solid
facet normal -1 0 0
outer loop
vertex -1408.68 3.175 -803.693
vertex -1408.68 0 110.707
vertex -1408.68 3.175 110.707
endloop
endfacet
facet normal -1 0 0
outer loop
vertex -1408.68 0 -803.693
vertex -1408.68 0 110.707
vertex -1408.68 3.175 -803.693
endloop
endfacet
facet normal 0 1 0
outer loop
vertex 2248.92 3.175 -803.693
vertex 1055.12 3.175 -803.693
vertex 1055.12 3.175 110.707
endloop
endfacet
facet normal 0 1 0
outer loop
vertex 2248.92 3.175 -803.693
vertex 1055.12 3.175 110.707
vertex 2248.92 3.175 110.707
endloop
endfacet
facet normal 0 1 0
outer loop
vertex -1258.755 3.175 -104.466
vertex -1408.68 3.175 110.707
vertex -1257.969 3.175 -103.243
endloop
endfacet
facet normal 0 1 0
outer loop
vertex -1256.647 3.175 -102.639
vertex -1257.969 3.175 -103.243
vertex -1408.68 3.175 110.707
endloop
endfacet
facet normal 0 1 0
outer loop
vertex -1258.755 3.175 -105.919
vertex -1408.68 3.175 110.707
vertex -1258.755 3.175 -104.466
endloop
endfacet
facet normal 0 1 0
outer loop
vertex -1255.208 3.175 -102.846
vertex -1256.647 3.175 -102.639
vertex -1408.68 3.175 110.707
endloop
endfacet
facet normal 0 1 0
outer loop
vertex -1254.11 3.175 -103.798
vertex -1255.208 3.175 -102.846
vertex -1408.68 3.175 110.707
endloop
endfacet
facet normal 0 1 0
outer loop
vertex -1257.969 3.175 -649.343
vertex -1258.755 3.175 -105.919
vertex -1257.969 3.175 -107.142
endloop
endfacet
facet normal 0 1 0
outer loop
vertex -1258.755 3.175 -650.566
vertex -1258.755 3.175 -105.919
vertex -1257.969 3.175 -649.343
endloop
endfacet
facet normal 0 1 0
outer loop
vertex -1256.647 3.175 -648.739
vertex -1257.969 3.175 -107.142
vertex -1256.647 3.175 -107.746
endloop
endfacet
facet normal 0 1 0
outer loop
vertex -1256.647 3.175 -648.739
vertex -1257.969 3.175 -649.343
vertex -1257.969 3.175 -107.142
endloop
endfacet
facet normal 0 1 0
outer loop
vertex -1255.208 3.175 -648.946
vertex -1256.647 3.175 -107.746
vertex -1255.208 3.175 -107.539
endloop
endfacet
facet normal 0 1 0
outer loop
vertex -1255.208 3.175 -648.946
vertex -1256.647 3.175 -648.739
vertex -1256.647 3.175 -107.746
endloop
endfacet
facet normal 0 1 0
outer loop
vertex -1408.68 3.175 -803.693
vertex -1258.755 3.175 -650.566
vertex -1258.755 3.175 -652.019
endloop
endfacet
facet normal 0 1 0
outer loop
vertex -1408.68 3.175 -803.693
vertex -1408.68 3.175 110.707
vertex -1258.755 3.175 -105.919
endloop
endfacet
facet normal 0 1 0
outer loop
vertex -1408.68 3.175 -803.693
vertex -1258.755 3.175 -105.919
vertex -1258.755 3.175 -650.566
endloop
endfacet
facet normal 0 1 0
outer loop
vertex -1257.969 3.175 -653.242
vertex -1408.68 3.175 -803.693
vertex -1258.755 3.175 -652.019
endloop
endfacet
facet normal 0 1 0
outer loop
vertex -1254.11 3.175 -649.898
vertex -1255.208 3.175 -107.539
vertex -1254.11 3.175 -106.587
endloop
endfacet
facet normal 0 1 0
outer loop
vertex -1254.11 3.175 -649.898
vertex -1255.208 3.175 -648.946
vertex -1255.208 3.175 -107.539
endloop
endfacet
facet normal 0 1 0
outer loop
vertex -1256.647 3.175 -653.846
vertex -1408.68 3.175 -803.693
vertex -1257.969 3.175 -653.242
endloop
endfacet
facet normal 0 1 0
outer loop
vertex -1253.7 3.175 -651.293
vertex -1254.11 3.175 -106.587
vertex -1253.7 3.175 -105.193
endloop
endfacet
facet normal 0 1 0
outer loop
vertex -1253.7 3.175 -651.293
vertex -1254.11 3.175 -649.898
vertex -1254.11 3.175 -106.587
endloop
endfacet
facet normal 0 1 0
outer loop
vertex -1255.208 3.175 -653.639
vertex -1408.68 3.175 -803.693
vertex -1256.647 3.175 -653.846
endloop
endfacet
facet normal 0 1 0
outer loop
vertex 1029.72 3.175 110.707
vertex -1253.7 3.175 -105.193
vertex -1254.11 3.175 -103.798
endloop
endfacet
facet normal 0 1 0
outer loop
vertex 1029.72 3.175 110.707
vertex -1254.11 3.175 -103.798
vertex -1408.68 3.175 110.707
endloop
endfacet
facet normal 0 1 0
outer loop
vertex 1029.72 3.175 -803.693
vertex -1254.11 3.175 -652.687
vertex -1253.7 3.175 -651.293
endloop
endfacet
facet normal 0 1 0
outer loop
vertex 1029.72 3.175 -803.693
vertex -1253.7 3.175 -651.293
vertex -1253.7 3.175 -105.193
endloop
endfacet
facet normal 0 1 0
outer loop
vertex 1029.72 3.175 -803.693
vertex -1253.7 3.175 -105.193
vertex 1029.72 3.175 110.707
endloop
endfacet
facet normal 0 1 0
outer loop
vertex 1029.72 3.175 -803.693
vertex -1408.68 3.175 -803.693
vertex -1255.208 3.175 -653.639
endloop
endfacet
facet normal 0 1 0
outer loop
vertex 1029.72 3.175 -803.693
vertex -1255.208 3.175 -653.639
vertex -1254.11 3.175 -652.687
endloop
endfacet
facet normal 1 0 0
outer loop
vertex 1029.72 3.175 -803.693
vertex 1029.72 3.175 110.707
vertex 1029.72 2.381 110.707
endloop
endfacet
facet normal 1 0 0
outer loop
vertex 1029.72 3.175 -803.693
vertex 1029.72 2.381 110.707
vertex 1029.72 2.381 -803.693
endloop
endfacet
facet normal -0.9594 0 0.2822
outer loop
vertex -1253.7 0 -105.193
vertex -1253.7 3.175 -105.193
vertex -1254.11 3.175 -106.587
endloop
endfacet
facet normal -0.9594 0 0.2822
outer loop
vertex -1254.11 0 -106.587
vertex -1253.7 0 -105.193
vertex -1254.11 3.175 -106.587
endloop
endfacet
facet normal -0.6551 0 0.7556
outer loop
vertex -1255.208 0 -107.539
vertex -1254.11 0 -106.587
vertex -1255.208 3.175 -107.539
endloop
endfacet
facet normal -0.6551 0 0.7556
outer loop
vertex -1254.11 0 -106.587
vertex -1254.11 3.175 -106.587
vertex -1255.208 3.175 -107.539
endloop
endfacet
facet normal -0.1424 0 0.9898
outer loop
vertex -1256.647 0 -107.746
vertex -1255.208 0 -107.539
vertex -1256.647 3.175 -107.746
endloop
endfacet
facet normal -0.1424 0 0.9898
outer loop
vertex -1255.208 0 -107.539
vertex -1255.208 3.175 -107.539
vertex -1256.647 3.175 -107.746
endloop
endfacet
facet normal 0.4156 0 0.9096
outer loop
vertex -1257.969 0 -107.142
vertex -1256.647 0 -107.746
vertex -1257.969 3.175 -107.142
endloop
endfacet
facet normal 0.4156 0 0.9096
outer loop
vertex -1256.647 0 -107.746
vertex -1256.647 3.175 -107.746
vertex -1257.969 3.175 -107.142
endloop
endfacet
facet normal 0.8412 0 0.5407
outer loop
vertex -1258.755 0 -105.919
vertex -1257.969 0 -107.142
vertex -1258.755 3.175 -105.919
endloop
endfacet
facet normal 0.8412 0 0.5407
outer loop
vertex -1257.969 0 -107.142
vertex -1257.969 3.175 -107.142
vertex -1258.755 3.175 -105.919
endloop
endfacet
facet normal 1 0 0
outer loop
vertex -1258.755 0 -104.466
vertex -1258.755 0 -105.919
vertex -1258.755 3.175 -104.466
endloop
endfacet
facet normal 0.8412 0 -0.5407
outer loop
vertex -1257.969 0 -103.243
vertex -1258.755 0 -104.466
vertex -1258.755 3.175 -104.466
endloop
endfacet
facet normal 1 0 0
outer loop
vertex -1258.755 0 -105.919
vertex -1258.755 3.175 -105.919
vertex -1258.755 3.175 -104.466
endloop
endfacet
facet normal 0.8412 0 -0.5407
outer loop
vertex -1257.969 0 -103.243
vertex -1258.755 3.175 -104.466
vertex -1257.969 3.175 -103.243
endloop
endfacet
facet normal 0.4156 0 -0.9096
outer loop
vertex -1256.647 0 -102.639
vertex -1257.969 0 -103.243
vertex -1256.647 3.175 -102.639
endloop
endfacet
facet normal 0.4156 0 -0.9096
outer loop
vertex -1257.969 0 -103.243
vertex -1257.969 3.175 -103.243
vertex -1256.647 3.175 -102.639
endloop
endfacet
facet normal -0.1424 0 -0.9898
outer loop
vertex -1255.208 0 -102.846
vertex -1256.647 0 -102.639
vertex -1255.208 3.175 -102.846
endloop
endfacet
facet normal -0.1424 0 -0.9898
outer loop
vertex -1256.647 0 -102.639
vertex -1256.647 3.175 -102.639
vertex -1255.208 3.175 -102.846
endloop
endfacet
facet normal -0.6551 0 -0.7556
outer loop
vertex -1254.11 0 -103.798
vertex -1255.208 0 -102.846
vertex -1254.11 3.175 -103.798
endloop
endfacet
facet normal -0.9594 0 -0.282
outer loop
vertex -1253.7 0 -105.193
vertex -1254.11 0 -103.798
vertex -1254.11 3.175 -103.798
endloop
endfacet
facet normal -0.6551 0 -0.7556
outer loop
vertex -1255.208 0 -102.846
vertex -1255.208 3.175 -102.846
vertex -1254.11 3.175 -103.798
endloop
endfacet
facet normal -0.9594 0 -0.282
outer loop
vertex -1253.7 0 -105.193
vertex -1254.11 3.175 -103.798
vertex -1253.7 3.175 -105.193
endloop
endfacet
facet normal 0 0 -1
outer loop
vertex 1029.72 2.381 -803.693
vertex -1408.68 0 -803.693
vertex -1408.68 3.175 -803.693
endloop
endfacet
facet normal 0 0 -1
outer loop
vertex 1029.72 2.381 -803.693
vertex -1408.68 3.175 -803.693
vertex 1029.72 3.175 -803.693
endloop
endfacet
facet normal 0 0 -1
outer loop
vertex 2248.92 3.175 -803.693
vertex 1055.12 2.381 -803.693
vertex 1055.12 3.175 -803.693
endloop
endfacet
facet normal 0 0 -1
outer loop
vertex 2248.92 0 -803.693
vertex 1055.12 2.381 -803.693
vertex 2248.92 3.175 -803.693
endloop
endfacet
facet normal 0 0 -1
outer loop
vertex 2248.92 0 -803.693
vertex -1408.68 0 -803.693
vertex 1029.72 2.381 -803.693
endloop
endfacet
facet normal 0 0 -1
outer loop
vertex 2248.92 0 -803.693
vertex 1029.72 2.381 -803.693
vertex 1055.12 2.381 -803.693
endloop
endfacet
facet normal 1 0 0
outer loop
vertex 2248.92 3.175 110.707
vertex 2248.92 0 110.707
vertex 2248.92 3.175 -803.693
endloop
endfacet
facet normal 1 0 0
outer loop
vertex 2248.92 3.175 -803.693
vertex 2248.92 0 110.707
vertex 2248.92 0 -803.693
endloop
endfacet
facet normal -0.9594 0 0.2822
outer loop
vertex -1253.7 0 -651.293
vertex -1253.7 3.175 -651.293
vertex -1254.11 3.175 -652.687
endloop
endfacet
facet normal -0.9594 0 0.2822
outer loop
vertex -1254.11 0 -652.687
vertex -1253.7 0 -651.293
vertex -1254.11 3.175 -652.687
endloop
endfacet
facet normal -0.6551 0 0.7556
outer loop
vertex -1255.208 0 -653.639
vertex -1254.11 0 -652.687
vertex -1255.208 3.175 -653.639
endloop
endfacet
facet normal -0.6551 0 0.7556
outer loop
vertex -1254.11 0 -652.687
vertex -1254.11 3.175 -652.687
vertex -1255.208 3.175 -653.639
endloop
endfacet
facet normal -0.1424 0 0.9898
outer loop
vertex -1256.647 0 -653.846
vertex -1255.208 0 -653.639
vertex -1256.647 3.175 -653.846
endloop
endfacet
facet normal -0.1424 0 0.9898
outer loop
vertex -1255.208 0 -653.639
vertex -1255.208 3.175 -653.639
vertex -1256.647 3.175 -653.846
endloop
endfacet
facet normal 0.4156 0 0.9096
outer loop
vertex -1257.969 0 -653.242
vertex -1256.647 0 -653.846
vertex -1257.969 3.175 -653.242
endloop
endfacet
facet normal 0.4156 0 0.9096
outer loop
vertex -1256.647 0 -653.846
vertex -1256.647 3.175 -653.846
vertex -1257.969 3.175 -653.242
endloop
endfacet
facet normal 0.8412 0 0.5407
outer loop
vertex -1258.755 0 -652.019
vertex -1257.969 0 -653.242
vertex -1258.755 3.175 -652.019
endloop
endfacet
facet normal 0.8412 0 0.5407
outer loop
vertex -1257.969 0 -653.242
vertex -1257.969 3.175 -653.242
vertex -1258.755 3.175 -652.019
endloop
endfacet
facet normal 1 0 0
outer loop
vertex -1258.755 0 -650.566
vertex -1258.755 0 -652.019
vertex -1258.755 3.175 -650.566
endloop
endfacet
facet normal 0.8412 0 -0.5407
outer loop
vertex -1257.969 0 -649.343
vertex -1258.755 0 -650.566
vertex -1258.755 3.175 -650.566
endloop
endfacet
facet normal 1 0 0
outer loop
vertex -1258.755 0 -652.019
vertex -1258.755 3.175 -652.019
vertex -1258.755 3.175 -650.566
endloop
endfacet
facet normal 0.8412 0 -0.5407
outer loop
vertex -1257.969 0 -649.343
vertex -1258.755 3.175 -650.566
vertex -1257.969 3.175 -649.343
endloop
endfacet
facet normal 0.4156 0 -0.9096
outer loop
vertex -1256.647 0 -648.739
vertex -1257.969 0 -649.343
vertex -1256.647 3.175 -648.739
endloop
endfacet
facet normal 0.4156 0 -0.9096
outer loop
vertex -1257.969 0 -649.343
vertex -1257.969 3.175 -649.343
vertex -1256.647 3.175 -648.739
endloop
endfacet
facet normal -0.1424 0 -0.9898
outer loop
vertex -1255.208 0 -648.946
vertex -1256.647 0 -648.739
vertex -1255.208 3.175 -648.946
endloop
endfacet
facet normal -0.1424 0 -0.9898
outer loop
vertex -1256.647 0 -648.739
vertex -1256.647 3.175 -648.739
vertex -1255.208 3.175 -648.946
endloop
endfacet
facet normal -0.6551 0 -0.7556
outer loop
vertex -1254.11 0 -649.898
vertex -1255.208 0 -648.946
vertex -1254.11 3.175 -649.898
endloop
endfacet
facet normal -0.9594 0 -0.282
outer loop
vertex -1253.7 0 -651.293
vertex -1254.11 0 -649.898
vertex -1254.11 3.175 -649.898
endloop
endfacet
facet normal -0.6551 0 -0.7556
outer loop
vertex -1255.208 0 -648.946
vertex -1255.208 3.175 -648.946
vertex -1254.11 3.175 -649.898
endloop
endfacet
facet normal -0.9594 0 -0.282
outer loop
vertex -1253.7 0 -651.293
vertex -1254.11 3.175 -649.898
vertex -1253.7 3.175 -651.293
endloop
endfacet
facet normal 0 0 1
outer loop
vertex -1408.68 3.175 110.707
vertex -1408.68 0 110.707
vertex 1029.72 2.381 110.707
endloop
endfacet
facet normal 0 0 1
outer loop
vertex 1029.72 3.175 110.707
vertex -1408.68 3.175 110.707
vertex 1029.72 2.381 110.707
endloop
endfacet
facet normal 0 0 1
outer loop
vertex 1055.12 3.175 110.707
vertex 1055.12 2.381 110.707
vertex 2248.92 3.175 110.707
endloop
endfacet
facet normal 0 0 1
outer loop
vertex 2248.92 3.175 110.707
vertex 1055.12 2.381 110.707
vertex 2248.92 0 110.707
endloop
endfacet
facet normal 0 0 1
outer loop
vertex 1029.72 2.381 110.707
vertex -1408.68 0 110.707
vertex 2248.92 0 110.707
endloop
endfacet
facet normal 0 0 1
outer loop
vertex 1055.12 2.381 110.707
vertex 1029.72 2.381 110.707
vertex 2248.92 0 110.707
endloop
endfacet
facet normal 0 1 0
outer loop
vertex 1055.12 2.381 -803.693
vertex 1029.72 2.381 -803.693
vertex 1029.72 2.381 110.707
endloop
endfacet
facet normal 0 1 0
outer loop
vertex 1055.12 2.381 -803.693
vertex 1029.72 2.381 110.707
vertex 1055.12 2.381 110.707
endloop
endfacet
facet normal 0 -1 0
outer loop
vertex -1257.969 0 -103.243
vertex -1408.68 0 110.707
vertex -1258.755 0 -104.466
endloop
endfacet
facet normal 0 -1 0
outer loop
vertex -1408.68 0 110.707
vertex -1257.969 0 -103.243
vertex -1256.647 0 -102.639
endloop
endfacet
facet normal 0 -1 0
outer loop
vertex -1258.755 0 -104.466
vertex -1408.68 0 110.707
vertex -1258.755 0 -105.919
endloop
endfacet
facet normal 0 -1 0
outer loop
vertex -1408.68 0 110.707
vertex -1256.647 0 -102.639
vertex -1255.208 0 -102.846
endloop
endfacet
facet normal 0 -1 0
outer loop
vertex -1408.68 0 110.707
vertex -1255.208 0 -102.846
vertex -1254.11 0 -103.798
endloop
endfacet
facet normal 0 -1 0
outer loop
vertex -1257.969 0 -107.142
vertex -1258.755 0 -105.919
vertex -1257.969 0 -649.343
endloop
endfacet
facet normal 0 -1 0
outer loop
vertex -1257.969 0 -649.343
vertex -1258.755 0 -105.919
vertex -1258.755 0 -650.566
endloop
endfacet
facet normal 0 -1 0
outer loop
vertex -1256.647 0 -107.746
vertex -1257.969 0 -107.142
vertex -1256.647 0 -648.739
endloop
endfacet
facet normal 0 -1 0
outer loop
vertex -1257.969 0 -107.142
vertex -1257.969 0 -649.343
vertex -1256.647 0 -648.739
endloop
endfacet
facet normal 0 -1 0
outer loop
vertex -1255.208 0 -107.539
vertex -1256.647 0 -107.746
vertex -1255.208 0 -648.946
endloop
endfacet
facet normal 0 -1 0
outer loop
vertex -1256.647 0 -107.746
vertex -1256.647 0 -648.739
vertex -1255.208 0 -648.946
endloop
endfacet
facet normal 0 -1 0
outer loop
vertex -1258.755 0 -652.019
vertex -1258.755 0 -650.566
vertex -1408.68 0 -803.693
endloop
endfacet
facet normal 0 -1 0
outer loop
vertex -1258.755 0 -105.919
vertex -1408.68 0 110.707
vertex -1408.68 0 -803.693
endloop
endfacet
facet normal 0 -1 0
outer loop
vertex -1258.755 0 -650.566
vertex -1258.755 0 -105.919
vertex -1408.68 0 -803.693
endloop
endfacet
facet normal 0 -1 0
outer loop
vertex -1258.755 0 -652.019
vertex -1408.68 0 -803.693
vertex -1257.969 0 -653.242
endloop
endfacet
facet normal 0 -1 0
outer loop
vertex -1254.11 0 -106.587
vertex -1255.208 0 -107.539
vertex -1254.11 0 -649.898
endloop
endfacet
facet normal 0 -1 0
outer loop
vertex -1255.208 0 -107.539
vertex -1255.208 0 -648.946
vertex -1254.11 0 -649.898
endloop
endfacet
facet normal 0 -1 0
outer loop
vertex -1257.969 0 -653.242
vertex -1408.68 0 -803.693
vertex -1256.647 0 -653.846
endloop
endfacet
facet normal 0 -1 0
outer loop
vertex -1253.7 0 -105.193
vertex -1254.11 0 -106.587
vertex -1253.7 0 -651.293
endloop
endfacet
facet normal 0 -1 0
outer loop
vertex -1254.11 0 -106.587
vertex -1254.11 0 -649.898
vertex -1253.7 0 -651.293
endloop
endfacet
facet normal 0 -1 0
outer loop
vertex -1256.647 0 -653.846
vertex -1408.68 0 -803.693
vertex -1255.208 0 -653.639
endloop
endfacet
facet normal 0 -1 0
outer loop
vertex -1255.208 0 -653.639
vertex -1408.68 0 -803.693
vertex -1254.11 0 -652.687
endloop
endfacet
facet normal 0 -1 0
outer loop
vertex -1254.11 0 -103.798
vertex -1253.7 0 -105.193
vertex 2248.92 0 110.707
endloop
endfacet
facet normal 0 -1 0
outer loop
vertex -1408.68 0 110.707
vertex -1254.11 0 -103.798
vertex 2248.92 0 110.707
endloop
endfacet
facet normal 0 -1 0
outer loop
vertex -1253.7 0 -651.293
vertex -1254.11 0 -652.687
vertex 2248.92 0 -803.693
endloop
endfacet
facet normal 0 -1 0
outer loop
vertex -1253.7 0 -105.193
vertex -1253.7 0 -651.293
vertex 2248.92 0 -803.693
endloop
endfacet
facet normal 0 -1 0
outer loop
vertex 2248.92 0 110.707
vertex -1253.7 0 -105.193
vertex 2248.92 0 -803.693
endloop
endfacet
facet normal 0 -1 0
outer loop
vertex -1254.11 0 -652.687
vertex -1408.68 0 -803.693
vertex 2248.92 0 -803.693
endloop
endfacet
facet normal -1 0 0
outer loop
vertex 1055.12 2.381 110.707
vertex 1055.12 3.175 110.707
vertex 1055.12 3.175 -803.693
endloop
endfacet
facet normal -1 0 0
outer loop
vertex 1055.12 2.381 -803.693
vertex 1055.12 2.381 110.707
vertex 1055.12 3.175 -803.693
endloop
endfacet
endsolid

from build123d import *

# Parameters (mm, degrees)
SKETCH1_W           = 3657.6
SKETCH1_H           = 914.4
BOSS_EXTRUDE1_DEPTH = 3.175
SKETCH2_R           = 2.5796875
CUT_EXTRUDE1_DEPTH  = 3.175
SKETCH3_W           = 25.4
SKETCH3_H           = 914.4
CUT_EXTRUDE2_DEPTH  = 0.79375


with BuildPart() as part:
    # Sketch1 → Boss-Extrude1 (new body)
    with BuildSketch(Plane(origin=(0, 0, 0), x_dir=(1, 0, 0), z_dir=(0, 1, 0))):
        with Locations((420.120139697, 346.492665891)):
            Rectangle(SKETCH1_W, SKETCH1_H)
    extrude(amount=BOSS_EXTRUDE1_DEPTH)

    # Sketch2 → Cut-Extrude1 (cut)
    with BuildSketch(Plane(origin=(0, 3.175, 0), x_dir=(1, 0, 0), z_dir=(0, 1, 0))):
        with Locations((-1256.279860303, 651.292665891)):
            Circle(SKETCH2_R)
        with Locations((-1256.279860303, 105.192665891)):
            Circle(SKETCH2_R)
    extrude(amount=-CUT_EXTRUDE1_DEPTH, mode=Mode.SUBTRACT)

    # Sketch3 → Cut-Extrude2 (cut)
    with BuildSketch(Plane(origin=(0, 3.175, 0), x_dir=(1, 0, 0), z_dir=(0, 1, 0))):
        with Locations((1042.420139697, 346.492665891)):
            Rectangle(SKETCH3_W, SKETCH3_H)
    extrude(amount=-CUT_EXTRUDE2_DEPTH, mode=Mode.SUBTRACT)


solid = part.part
